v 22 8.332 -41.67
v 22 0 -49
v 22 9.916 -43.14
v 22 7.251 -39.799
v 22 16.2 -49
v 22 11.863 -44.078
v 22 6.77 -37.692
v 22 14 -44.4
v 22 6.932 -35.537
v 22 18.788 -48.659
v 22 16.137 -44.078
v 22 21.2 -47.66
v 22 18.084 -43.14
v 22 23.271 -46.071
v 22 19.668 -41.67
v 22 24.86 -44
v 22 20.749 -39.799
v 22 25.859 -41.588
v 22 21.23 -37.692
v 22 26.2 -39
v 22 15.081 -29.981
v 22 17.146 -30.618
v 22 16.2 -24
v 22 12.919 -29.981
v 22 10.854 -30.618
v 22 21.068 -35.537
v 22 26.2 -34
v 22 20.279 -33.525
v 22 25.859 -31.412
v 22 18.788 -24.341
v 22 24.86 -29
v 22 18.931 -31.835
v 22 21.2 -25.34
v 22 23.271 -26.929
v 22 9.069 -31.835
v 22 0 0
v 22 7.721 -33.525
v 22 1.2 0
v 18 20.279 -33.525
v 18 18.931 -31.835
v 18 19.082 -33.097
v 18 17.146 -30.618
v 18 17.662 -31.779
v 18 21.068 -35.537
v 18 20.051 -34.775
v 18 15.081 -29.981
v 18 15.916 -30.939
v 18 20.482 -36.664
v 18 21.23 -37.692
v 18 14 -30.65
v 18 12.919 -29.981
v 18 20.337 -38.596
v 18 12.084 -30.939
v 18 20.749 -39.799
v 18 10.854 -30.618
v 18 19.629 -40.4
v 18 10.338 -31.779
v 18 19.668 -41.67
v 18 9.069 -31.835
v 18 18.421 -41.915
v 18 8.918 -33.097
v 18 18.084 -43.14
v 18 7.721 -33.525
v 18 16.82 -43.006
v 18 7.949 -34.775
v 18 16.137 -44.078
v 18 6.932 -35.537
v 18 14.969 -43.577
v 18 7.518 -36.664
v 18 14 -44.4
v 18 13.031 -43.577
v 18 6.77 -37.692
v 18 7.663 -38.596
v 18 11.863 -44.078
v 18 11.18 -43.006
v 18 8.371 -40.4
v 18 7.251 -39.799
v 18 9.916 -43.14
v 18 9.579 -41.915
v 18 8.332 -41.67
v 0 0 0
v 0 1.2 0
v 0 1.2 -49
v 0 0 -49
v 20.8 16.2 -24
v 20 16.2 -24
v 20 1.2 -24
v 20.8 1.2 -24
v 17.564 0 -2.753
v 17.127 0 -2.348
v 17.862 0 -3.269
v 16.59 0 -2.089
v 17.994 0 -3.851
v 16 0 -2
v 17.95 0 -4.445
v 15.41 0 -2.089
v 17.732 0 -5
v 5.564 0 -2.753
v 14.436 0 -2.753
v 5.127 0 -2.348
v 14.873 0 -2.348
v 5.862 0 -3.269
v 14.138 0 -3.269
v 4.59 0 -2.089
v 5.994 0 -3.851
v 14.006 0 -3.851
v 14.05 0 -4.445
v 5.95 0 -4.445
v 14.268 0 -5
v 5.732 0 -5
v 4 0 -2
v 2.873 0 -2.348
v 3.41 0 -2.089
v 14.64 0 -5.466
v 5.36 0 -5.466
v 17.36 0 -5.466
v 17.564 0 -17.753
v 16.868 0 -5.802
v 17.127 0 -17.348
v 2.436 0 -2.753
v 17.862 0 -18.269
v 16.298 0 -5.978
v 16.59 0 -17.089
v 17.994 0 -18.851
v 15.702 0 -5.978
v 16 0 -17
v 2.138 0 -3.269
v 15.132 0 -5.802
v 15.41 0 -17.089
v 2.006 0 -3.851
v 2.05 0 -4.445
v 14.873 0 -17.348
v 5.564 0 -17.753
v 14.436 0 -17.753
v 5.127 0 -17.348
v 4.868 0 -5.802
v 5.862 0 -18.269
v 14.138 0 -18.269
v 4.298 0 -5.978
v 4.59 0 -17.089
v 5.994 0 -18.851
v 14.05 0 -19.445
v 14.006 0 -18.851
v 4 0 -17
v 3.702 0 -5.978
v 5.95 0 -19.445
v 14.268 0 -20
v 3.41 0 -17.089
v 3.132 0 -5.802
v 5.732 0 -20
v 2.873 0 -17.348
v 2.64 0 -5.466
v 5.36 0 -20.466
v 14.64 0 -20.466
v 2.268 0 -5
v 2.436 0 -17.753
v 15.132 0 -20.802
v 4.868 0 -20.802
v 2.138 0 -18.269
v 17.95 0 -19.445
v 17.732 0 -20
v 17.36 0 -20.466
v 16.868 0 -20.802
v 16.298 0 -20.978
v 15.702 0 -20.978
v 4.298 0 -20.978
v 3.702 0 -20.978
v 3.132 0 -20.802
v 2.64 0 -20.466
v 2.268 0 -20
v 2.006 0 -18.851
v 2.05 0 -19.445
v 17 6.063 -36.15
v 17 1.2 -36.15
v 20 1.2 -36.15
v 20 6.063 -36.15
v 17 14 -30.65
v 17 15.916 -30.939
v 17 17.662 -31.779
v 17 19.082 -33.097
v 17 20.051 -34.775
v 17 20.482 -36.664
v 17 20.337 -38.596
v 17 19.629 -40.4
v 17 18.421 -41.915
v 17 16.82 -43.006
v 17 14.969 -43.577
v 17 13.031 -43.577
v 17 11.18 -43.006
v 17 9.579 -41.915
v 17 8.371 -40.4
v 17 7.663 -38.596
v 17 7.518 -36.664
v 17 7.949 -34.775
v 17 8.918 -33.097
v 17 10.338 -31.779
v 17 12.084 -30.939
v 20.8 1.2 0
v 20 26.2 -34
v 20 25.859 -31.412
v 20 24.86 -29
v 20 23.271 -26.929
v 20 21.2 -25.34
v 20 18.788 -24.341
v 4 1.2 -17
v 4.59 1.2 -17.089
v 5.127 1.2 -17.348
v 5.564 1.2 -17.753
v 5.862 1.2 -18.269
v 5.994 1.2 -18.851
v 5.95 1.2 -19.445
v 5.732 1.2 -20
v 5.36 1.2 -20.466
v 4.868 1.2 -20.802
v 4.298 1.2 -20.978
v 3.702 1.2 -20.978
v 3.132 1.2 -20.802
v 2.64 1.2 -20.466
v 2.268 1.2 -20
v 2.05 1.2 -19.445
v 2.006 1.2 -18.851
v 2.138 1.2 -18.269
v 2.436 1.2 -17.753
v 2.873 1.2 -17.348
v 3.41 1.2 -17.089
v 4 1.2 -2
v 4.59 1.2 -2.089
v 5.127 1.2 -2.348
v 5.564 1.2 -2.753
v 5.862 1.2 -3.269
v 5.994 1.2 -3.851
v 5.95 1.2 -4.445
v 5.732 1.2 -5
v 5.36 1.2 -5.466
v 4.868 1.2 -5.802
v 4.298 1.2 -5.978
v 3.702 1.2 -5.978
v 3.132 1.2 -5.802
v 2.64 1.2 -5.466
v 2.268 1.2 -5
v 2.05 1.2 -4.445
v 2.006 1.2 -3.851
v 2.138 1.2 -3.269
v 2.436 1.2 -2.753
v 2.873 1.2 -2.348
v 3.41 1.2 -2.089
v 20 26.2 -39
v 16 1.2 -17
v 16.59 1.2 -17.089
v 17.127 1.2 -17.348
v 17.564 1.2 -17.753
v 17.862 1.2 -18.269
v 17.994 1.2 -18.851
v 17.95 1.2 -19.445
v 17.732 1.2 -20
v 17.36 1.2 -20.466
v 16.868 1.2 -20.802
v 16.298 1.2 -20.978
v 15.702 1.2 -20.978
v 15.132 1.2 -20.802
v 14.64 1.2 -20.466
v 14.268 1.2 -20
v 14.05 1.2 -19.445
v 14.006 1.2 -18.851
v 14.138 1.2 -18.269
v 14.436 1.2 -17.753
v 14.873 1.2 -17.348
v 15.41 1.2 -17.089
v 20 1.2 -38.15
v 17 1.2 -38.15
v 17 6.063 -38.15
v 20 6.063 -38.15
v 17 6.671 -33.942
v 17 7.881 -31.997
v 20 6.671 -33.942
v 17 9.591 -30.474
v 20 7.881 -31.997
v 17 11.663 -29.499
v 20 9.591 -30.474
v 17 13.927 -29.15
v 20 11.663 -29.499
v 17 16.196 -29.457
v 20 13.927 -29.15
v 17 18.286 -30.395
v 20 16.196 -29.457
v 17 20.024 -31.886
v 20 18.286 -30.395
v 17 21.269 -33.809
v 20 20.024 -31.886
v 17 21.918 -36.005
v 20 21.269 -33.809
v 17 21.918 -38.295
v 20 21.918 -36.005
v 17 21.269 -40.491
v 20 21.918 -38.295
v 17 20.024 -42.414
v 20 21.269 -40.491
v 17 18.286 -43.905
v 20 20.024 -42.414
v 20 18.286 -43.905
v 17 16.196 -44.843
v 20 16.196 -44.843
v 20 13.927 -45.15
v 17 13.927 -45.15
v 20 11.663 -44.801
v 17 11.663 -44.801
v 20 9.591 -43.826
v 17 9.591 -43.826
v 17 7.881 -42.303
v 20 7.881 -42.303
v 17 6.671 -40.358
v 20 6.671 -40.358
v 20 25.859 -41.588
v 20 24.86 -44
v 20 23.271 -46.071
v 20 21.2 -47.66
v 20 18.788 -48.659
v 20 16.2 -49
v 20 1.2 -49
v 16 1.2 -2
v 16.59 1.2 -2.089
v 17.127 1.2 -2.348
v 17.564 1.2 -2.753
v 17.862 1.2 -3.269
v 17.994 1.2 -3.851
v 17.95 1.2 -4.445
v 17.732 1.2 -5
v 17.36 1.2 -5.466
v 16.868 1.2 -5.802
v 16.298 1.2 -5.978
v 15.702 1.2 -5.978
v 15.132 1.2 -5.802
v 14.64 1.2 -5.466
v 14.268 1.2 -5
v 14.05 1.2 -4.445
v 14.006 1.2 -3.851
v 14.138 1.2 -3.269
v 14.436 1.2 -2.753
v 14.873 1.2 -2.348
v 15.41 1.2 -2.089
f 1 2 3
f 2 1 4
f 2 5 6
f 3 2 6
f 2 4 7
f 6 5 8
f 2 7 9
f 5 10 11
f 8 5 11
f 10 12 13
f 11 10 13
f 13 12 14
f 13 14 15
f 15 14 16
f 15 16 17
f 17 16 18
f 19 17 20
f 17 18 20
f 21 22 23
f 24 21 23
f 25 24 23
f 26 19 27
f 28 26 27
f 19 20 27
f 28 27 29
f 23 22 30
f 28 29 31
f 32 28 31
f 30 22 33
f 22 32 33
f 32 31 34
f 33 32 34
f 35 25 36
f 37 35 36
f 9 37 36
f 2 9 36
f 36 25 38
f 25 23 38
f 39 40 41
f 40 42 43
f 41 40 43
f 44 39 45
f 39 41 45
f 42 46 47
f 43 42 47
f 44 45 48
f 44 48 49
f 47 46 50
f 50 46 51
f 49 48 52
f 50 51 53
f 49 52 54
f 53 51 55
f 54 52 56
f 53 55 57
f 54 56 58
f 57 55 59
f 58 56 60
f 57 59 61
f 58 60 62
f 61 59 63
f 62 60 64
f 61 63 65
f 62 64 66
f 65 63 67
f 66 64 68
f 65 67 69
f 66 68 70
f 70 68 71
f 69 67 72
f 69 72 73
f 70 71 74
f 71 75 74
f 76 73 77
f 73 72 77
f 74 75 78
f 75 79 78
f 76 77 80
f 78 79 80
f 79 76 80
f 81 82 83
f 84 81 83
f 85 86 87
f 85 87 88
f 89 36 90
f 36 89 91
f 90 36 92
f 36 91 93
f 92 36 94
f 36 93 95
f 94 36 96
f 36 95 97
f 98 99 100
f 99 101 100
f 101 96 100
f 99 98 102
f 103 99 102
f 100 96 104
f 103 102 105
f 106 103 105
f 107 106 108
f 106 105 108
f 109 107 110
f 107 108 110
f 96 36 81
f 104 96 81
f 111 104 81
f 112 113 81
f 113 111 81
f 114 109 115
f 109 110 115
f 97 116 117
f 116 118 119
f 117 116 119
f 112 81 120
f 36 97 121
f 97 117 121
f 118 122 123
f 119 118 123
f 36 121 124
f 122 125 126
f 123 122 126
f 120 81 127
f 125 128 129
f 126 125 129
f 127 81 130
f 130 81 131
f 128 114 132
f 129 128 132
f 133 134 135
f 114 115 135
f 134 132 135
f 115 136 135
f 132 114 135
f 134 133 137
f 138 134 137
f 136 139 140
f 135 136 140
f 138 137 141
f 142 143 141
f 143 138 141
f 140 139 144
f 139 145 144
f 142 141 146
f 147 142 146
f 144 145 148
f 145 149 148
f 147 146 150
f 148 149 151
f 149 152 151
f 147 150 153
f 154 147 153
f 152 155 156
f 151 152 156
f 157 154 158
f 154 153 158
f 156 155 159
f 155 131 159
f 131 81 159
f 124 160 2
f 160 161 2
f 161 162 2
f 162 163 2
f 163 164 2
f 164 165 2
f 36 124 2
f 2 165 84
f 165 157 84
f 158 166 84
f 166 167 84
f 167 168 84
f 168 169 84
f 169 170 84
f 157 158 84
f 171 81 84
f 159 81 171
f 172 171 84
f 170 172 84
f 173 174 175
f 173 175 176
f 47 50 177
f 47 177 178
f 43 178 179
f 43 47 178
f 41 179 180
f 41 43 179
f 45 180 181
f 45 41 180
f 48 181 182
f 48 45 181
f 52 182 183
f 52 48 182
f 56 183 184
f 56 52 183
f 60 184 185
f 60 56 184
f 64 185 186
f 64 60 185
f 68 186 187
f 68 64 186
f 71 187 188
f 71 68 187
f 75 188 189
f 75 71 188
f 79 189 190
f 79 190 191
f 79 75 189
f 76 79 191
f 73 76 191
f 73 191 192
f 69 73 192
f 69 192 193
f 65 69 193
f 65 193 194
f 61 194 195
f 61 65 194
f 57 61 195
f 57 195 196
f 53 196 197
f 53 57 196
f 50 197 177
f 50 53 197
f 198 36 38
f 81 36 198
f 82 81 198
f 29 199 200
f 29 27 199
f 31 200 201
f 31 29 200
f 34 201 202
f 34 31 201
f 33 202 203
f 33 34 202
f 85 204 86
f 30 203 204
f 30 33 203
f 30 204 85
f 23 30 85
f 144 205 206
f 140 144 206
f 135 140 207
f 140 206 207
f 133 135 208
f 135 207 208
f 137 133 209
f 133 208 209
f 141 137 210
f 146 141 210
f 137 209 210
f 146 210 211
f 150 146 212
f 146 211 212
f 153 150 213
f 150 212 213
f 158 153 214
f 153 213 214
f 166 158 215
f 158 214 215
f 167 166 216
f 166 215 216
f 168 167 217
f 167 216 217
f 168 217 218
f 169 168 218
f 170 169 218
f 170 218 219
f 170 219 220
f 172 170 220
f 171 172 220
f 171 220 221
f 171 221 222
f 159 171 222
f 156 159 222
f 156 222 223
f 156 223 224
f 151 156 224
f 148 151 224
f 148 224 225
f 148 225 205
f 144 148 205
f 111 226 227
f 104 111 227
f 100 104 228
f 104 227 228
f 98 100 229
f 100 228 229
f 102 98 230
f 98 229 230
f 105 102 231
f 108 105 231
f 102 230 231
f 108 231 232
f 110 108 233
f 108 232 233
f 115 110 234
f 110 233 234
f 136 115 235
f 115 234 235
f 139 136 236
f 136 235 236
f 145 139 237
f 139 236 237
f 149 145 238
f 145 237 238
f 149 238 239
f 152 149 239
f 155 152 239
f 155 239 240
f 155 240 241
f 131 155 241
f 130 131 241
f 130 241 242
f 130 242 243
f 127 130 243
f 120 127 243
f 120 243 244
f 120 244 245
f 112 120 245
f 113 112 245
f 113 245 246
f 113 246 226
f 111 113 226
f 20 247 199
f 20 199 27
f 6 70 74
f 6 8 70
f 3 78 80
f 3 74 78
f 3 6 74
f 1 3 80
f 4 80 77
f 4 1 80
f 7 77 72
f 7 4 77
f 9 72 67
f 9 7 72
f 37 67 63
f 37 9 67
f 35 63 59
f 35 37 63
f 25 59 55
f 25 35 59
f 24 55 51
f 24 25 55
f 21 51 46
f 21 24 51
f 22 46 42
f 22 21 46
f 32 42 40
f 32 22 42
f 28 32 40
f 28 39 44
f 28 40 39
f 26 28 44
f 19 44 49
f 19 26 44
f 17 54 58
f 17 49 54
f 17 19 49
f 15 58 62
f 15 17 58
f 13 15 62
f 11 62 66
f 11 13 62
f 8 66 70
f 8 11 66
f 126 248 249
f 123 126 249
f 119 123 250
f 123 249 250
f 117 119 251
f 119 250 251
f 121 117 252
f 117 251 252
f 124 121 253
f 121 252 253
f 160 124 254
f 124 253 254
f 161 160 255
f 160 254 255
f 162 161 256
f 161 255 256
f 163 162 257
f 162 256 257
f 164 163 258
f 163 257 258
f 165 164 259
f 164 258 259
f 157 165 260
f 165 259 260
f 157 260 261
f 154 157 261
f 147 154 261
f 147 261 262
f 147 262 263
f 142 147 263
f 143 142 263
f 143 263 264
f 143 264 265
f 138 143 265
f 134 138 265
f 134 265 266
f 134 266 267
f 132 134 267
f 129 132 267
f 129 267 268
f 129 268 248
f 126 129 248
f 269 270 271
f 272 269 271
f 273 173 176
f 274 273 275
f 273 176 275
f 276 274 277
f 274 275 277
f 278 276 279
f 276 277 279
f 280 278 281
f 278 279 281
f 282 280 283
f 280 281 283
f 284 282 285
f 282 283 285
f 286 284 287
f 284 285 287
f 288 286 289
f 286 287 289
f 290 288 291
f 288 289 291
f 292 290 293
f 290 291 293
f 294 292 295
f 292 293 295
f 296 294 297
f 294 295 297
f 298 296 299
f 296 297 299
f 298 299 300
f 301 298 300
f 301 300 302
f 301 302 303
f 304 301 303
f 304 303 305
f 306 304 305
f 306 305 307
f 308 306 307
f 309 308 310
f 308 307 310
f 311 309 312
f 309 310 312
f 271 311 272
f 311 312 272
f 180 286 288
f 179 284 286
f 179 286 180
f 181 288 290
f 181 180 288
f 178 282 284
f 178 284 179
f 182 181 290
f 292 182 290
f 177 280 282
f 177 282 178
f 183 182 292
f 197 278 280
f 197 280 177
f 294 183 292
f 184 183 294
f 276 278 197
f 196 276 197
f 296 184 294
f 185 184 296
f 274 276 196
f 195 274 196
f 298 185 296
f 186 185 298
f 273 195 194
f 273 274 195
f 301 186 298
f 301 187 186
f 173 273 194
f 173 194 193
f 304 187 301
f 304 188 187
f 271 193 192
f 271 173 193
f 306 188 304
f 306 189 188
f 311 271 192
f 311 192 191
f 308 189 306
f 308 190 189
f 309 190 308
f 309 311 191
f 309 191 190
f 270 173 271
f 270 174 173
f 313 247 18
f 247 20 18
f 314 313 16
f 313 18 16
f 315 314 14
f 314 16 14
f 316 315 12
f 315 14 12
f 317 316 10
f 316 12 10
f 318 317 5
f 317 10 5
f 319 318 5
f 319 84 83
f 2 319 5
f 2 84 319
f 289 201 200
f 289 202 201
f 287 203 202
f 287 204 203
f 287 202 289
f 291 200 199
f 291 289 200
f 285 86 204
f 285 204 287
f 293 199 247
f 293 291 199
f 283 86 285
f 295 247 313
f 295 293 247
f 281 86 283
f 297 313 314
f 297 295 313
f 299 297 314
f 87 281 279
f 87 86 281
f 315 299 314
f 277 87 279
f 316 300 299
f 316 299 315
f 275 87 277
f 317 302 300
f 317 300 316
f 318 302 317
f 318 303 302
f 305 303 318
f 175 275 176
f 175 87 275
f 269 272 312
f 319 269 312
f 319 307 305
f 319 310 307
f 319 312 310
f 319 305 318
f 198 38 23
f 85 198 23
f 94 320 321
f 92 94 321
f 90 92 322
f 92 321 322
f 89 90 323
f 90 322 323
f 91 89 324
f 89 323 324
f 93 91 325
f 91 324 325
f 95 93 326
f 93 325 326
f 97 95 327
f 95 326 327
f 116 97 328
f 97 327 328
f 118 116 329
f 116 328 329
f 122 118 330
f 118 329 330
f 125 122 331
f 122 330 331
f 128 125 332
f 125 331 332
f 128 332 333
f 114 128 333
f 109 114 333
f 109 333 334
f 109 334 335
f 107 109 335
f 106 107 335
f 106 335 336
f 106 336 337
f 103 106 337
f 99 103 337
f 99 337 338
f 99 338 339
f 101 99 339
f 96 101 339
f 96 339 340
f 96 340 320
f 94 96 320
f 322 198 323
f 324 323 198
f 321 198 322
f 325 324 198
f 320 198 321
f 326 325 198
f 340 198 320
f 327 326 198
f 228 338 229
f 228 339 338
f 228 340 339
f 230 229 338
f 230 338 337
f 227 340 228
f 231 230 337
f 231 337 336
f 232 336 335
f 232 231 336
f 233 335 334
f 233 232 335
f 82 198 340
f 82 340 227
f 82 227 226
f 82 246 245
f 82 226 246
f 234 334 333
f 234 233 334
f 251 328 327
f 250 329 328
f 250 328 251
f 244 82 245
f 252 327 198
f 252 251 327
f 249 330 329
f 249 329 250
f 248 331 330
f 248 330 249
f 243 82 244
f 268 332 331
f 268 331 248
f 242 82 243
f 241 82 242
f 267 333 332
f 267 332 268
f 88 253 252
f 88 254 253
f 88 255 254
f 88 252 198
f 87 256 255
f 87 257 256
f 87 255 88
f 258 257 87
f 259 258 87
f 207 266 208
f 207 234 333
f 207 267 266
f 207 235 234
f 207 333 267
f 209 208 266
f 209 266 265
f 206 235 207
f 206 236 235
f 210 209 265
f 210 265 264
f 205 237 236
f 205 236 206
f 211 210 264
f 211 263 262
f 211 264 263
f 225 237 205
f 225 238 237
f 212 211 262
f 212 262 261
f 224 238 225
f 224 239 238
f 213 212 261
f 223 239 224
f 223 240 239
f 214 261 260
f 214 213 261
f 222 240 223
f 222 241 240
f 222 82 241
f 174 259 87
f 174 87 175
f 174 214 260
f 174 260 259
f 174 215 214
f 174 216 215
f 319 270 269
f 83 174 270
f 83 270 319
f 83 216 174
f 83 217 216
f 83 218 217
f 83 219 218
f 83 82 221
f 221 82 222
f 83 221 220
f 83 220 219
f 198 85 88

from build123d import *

# Parameters (mm, degrees)
SKETCH_1_W          = 49
SKETCH_1_H          = 1.2
EXTRUDE_1_DEPTH     = 22
CUT_EXTRUDE_1_REACH = 55.726
SKETCH_2_R          = 2
SKETCH_3_W          = 2
SKETCH_3_H          = 25
EXTRUDE_2_DEPTH     = 25
CUT_EXTRUDE_2_REACH = 61.762
SKETCH_4_R          = 7.25
SKETCH_5_R          = 8
SKETCH_5_R_2        = 7.25
EXTRUDE_3_DEPTH     = 3
EXTRUDE_START       = -1
SKETCH_6_R          = 8
SKETCH_6_R_2        = 6.5
EXTRUDE_4_DEPTH     = 1
EXTRUDE_5_REACH     = 60.107
SKETCH_7_W          = 2
SKETCH_7_H          = 6.3
FILLET_1_R          = 10
EXTRUDE_6_DEPTH     = 1.2


with BuildPart() as part:
    # 草图1 → 凸台-拉伸1 (new body)
    with BuildSketch(Plane(origin=(0, 0, 0), x_dir=(0, 0, -1), z_dir=(1, 0, 0))):
        with Locations((24.5, 0.6)):
            Rectangle(SKETCH_1_W, SKETCH_1_H)
    extrude(amount=EXTRUDE_1_DEPTH)

    # 草图2 → 切除-拉伸1 (cut, up to next)
    with BuildSketch(Plane(origin=(0, 1.2, 0), x_dir=(1, 0, 0), z_dir=(0, 1, 0)), mode=Mode.PRIVATE) as cut_extrude_1_sk1:
        with Locations(Location((16, 19, 0), (0, 0, 270))):
            Circle(SKETCH_2_R)
    cut_extrude_1_tool1 = extrude(cut_extrude_1_sk1.sketch, amount=-CUT_EXTRUDE_1_REACH, mode=Mode.PRIVATE) & part.part
    # 草图2 → 切除-拉伸1 (cut, up to next)
    with BuildSketch(Plane(origin=(0, 1.2, 0), x_dir=(1, 0, 0), z_dir=(0, 1, 0)), mode=Mode.PRIVATE) as cut_extrude_1_sk2:
        with Locations(Location((4, 19, 0), (0, 0, 270))):
            Circle(SKETCH_2_R)
    cut_extrude_1_tool2 = extrude(cut_extrude_1_sk2.sketch, amount=-CUT_EXTRUDE_1_REACH, mode=Mode.PRIVATE) & part.part
    # 草图2 → 切除-拉伸1 (cut, up to next)
    with BuildSketch(Plane(origin=(0, 1.2, 0), x_dir=(1, 0, 0), z_dir=(0, 1, 0)), mode=Mode.PRIVATE) as cut_extrude_1_sk3:
        with Locations(Location((4, 4, 0), (0, 0, 270))):
            Circle(SKETCH_2_R)
    cut_extrude_1_tool3 = extrude(cut_extrude_1_sk3.sketch, amount=-CUT_EXTRUDE_1_REACH, mode=Mode.PRIVATE) & part.part
    # 草图2 → 切除-拉伸1 (cut, up to next)
    with BuildSketch(Plane(origin=(0, 1.2, 0), x_dir=(1, 0, 0), z_dir=(0, 1, 0)), mode=Mode.PRIVATE) as cut_extrude_1_sk4:
        with Locations(Location((16, 4, 0), (0, 0, 270))):
            Circle(SKETCH_2_R)
    cut_extrude_1_tool4 = extrude(cut_extrude_1_sk4.sketch, amount=-CUT_EXTRUDE_1_REACH, mode=Mode.PRIVATE) & part.part
    add(cut_extrude_1_tool1.solids().sort_by_distance((16, 1.2, -19))[0], mode=Mode.SUBTRACT)
    add(cut_extrude_1_tool2.solids().sort_by_distance((4, 1.2, -19))[0], mode=Mode.SUBTRACT)
    add(cut_extrude_1_tool3.solids().sort_by_distance((4, 1.2, -4))[0], mode=Mode.SUBTRACT)
    add(cut_extrude_1_tool4.solids().sort_by_distance((16, 1.2, -4))[0], mode=Mode.SUBTRACT)

    # 草图3 → 凸台-拉伸2 (add)
    with BuildSketch(Plane(origin=(0, 1.2, 0), x_dir=(1, 0, 0), z_dir=(0, 1, 0))):
        with Locations((21, 36.5)):
            Rectangle(SKETCH_3_W, SKETCH_3_H)
    extrude(amount=EXTRUDE_2_DEPTH)

    # 草图4 → 切除-拉伸2 (cut, up to next)
    with BuildSketch(Plane(origin=(22, 0, 0), x_dir=(0, 0, -1), z_dir=(1, 0, 0)), mode=Mode.PRIVATE) as cut_extrude_2_sk1:
        with Locations((37.15, 14)):
            Circle(SKETCH_4_R)
    cut_extrude_2_tool1 = extrude(cut_extrude_2_sk1.sketch, amount=-CUT_EXTRUDE_2_REACH, mode=Mode.PRIVATE) & part.part
    add(cut_extrude_2_tool1.solids().sort_by_distance((22, 14, -37.15))[0], mode=Mode.SUBTRACT)

    # 草图5 → 凸台-拉伸3 (add)
    with BuildSketch(Plane.ZY.offset(-20)):
        with Locations(Location((-37.15, 14, 0), (0, 0, 180))):
            Circle(SKETCH_5_R)
        with Locations(Location((-37.15, 14, 0), (0, 0, 180))):
            Circle(SKETCH_5_R_2, mode=Mode.SUBTRACT)
    extrude(amount=EXTRUDE_3_DEPTH)

    # 草图6 → 凸台-拉伸4 (add)
    with BuildSketch(Plane.ZY.offset(-17).offset(EXTRUDE_START)):
        with Locations(Location((-37.15, 14, 0), (0, 0, 180))):
            Circle(SKETCH_6_R)
        with Locations((-37.15, 14)):
            Circle(SKETCH_6_R_2, mode=Mode.SUBTRACT)
    extrude(amount=EXTRUDE_4_DEPTH)

    # 草图7 → 凸台-拉伸5 (add, up to next)
    with BuildSketch(Plane.ZY.offset(-17), mode=Mode.PRIVATE) as extrude_5_sk1:
        with Locations((-37.15, 4.35)):
            Rectangle(SKETCH_7_W, SKETCH_7_H)
    extrude_5_tool1 = extrude(extrude_5_sk1.sketch, amount=-EXTRUDE_5_REACH, mode=Mode.PRIVATE) - part.part
    add(extrude_5_tool1.solids().sort_by_distance((17, 4.35, -37.15))[0])

    # 圆角1
    fillet_1_edges = [part.edges().sort_by_distance(p)[0] for p in [
        (21, 26.2, -24),
        (21, 26.2, -49),
    ]]
    fillet(fillet_1_edges, radius=FILLET_1_R)

    # 草图8 → 凸台-拉伸6 (add)
    with BuildSketch(Plane(origin=(22, 0, 0), x_dir=(0, 0, -1), z_dir=(1, 0, 0))):
        Polygon((0, 1.2), (24, 16.2), (24, 1.2), align=None)
    extrude(amount=-EXTRUDE_6_DEPTH)


solid = part.part
